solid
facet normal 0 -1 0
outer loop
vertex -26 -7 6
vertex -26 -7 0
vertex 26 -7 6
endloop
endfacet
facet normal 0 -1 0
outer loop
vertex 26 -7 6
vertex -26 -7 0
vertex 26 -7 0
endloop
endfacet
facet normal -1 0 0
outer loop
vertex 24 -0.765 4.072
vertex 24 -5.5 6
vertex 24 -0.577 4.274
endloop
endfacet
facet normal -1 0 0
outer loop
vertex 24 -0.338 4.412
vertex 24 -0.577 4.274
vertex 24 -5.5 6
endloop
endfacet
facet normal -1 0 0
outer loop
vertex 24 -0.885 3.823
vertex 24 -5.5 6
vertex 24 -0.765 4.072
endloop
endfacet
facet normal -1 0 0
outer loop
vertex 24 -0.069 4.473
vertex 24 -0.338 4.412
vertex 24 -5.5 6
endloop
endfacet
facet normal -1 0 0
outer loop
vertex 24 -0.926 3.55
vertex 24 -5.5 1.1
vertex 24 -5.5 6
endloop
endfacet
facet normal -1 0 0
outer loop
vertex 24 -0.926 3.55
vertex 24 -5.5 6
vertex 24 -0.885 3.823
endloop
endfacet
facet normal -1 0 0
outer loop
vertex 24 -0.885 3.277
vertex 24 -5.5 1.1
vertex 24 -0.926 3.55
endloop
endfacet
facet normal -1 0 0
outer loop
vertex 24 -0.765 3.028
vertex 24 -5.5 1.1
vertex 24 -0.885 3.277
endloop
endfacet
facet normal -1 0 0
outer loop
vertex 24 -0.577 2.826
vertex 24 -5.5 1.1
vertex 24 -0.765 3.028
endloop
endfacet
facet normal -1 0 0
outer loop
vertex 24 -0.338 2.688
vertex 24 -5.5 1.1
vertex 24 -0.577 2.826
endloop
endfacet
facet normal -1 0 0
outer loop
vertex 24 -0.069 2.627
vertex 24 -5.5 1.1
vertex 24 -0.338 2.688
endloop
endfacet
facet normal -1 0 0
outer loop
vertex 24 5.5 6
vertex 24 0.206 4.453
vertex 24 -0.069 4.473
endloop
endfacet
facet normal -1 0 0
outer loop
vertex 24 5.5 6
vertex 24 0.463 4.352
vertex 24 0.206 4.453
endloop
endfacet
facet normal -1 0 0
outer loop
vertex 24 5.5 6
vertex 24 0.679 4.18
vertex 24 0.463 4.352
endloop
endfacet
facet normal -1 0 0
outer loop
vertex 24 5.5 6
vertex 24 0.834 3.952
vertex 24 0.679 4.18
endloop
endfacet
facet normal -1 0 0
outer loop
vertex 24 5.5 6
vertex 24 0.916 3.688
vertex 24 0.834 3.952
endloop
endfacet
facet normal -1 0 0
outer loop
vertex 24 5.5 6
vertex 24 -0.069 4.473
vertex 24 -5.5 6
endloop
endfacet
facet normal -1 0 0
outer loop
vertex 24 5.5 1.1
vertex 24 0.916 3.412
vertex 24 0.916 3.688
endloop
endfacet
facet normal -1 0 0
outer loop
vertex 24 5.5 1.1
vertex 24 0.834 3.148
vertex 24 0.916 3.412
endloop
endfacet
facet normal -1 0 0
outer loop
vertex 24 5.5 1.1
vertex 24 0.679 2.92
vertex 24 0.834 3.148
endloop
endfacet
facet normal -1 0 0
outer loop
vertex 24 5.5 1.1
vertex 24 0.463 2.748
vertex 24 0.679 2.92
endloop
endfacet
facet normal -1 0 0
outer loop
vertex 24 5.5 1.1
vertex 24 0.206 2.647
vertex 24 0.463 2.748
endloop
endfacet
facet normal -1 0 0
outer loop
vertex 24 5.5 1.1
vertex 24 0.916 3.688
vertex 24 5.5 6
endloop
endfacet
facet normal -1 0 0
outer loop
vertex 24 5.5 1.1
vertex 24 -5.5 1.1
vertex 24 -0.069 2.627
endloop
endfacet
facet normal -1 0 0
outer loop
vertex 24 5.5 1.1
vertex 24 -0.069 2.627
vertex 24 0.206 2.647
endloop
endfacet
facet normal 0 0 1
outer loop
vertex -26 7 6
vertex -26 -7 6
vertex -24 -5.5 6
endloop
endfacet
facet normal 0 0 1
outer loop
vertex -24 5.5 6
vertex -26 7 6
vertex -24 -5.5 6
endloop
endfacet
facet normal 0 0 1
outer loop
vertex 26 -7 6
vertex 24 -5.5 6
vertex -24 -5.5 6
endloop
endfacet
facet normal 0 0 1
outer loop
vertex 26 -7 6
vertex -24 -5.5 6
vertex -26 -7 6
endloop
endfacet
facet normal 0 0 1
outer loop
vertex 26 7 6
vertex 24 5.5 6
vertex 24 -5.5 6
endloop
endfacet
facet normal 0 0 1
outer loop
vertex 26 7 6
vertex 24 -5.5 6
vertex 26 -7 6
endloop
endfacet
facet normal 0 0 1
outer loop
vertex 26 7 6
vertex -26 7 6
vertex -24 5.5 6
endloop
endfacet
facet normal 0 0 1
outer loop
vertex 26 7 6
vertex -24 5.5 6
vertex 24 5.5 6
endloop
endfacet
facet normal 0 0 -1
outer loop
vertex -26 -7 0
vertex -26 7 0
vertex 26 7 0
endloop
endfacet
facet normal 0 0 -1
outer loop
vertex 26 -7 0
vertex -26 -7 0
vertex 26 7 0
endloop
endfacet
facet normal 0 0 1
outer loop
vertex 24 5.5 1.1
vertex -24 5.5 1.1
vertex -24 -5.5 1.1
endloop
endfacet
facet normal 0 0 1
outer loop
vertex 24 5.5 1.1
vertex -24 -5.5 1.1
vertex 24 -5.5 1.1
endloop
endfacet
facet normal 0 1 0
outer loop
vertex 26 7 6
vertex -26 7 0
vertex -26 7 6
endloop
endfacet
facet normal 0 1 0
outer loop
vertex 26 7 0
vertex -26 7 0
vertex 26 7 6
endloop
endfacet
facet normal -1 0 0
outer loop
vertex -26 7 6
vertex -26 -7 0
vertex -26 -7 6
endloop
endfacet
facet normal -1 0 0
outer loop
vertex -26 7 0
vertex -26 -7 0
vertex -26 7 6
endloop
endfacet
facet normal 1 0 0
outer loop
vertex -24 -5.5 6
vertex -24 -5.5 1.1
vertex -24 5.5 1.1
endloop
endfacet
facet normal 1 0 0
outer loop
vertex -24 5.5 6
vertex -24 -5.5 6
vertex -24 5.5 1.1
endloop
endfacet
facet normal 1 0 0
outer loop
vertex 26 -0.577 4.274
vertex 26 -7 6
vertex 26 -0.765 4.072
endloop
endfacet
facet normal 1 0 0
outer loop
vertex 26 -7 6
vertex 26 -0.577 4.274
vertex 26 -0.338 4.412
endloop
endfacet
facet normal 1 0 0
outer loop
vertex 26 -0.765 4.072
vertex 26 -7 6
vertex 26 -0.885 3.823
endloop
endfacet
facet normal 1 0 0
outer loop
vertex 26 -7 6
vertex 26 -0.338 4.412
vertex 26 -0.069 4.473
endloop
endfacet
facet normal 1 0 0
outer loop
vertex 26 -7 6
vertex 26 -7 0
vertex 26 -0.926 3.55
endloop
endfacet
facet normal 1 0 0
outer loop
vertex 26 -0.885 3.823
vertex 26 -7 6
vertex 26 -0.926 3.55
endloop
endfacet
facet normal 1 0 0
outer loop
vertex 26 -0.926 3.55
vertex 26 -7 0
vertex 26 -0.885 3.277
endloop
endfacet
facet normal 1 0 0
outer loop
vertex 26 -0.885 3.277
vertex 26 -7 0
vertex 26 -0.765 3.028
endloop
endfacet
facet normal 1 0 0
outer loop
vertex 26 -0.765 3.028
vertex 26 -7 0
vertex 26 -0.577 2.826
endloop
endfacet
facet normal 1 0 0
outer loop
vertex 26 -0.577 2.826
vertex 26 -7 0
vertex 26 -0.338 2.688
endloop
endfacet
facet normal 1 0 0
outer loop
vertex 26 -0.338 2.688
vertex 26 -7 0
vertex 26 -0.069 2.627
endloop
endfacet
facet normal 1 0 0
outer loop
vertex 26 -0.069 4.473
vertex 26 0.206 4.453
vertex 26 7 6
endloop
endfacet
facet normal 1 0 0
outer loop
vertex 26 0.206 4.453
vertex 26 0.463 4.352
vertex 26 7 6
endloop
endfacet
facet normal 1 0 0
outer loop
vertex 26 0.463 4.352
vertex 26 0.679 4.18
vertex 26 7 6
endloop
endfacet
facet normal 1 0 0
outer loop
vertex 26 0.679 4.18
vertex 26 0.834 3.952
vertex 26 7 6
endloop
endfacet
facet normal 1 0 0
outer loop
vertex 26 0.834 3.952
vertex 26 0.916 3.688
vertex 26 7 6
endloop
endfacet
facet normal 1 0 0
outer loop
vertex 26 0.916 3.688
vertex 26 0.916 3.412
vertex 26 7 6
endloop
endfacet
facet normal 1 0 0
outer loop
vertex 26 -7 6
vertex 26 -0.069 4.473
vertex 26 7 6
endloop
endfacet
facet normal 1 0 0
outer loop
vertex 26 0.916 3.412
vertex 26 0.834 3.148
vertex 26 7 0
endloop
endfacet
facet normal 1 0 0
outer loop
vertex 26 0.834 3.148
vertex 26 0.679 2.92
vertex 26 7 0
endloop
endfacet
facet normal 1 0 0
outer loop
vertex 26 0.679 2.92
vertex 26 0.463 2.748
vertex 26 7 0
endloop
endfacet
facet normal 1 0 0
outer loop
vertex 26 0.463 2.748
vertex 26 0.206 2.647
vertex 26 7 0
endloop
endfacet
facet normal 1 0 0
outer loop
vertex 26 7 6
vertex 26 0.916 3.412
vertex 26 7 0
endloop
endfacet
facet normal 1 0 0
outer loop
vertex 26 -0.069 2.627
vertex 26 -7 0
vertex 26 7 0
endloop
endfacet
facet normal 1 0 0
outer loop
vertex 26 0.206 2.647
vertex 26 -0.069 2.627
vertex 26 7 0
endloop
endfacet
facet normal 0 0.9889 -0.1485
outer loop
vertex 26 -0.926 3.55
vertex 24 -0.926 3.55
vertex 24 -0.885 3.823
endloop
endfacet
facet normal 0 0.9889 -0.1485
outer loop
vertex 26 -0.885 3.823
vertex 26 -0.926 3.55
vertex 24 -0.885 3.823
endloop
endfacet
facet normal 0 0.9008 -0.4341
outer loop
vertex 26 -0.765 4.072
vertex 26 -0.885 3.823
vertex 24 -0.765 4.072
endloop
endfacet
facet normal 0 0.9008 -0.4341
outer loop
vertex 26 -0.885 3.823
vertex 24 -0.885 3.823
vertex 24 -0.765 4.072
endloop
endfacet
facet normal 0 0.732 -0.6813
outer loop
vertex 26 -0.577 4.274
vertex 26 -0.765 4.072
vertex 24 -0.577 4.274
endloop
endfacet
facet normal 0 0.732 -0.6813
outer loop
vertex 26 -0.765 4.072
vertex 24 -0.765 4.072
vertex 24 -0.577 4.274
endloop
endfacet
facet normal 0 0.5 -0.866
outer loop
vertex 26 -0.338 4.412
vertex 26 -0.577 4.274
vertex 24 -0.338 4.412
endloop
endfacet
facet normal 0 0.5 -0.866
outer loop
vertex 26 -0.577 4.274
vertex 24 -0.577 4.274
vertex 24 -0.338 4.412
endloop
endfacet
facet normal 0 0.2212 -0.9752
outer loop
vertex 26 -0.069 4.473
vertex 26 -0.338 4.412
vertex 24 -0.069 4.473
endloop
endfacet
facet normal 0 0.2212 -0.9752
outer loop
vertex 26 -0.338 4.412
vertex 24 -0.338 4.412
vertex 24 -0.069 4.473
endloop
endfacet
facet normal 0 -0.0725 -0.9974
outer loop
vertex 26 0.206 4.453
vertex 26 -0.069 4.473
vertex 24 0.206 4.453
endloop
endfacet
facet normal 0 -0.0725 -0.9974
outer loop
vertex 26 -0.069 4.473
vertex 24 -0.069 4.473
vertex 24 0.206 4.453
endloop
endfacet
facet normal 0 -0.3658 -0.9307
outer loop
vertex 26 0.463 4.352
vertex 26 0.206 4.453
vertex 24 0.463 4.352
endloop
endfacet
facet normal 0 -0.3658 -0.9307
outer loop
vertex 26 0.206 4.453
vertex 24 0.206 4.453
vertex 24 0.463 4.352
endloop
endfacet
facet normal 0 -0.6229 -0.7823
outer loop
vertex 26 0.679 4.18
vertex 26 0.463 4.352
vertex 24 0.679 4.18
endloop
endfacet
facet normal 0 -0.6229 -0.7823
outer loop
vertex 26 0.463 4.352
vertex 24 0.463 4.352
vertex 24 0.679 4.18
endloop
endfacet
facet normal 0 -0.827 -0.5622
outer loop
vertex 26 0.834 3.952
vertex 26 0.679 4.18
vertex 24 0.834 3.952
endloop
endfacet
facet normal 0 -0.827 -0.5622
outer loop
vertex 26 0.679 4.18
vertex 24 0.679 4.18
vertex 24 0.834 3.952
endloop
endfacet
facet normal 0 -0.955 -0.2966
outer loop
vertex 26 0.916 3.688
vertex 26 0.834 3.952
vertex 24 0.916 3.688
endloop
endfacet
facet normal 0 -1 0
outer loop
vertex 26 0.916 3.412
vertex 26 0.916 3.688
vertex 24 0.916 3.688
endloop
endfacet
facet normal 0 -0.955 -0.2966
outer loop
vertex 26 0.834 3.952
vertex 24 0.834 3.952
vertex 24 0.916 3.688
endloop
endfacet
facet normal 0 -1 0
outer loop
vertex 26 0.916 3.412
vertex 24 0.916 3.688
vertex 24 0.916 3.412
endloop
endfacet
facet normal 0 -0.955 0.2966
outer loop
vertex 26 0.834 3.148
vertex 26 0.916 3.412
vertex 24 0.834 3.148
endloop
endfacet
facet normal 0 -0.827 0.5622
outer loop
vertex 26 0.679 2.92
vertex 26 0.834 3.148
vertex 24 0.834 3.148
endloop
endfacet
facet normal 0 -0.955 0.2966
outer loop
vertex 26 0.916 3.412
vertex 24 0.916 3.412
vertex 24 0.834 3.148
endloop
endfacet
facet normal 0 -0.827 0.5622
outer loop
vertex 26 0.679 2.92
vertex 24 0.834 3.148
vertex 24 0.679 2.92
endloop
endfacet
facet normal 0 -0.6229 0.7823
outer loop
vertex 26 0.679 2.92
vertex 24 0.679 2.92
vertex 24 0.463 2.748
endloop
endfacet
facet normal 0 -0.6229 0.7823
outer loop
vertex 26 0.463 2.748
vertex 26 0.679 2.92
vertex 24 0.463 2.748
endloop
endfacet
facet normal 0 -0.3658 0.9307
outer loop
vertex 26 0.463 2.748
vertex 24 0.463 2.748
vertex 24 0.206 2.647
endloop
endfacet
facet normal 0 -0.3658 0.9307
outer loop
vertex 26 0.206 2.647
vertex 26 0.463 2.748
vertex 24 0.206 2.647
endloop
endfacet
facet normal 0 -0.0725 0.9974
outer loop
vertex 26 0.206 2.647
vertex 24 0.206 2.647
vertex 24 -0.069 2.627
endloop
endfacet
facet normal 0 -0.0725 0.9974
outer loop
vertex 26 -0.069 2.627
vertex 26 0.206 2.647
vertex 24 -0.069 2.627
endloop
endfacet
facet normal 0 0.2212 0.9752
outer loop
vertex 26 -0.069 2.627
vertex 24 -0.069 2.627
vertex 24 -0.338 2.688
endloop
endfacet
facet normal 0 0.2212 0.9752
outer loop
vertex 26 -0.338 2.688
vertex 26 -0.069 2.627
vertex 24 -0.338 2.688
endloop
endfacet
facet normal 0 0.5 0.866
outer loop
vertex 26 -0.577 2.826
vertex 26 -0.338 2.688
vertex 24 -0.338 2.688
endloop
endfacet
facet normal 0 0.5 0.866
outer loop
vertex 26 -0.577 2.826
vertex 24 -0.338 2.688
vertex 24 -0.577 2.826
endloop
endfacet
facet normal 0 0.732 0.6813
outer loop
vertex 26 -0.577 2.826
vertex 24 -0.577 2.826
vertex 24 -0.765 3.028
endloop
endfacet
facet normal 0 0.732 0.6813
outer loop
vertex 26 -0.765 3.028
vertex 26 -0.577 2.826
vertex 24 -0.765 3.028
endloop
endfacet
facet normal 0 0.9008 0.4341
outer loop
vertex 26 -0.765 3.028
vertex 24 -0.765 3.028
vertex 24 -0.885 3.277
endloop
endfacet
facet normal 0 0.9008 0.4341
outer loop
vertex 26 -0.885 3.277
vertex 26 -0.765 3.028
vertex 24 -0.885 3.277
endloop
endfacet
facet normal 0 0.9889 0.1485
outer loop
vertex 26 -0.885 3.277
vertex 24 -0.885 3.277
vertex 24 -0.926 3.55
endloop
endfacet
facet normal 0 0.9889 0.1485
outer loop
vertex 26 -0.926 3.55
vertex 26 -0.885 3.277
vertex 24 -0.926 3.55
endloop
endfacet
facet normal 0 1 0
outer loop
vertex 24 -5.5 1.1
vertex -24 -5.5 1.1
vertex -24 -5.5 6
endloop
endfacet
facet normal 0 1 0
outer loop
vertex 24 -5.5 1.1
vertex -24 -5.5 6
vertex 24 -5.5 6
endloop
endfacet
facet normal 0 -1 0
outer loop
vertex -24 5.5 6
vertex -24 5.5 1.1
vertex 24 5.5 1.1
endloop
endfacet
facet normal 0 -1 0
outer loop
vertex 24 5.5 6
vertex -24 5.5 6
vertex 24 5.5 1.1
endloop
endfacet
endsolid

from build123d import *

# Parameters (mm, degrees)
F0_W     = 48
F0_H     = 11
F1_DEPTH = 1.1
F0_W_2   = 52
F0_H_2   = 14
F2_DEPTH = 6
F3_R     = 0.925956
F4_DEPTH = 25


with BuildPart() as f1:
    # F0 (on Top) → F1 (new body)
    with BuildSketch(Plane.XY):
        Rectangle(F0_W, F0_H)
    extrude(amount=F1_DEPTH)

    # F0 (on Top) → F2 (join)
    with BuildSketch(Plane.XY):
        Rectangle(F0_W_2, F0_H_2)
        Rectangle(F0_W, F0_H, mode=Mode.SUBTRACT)
    extrude(amount=F2_DEPTH)

    # F3 (on face) → F4 (cut)
    with BuildSketch(Plane(origin=(24, 0, 0), x_dir=(0, -1, 0), z_dir=(-1, 0, 0))):
        with Locations((0, 3.55)):
            Circle(F3_R)
    extrude(amount=-F4_DEPTH, mode=Mode.SUBTRACT)


solid = f1.part
